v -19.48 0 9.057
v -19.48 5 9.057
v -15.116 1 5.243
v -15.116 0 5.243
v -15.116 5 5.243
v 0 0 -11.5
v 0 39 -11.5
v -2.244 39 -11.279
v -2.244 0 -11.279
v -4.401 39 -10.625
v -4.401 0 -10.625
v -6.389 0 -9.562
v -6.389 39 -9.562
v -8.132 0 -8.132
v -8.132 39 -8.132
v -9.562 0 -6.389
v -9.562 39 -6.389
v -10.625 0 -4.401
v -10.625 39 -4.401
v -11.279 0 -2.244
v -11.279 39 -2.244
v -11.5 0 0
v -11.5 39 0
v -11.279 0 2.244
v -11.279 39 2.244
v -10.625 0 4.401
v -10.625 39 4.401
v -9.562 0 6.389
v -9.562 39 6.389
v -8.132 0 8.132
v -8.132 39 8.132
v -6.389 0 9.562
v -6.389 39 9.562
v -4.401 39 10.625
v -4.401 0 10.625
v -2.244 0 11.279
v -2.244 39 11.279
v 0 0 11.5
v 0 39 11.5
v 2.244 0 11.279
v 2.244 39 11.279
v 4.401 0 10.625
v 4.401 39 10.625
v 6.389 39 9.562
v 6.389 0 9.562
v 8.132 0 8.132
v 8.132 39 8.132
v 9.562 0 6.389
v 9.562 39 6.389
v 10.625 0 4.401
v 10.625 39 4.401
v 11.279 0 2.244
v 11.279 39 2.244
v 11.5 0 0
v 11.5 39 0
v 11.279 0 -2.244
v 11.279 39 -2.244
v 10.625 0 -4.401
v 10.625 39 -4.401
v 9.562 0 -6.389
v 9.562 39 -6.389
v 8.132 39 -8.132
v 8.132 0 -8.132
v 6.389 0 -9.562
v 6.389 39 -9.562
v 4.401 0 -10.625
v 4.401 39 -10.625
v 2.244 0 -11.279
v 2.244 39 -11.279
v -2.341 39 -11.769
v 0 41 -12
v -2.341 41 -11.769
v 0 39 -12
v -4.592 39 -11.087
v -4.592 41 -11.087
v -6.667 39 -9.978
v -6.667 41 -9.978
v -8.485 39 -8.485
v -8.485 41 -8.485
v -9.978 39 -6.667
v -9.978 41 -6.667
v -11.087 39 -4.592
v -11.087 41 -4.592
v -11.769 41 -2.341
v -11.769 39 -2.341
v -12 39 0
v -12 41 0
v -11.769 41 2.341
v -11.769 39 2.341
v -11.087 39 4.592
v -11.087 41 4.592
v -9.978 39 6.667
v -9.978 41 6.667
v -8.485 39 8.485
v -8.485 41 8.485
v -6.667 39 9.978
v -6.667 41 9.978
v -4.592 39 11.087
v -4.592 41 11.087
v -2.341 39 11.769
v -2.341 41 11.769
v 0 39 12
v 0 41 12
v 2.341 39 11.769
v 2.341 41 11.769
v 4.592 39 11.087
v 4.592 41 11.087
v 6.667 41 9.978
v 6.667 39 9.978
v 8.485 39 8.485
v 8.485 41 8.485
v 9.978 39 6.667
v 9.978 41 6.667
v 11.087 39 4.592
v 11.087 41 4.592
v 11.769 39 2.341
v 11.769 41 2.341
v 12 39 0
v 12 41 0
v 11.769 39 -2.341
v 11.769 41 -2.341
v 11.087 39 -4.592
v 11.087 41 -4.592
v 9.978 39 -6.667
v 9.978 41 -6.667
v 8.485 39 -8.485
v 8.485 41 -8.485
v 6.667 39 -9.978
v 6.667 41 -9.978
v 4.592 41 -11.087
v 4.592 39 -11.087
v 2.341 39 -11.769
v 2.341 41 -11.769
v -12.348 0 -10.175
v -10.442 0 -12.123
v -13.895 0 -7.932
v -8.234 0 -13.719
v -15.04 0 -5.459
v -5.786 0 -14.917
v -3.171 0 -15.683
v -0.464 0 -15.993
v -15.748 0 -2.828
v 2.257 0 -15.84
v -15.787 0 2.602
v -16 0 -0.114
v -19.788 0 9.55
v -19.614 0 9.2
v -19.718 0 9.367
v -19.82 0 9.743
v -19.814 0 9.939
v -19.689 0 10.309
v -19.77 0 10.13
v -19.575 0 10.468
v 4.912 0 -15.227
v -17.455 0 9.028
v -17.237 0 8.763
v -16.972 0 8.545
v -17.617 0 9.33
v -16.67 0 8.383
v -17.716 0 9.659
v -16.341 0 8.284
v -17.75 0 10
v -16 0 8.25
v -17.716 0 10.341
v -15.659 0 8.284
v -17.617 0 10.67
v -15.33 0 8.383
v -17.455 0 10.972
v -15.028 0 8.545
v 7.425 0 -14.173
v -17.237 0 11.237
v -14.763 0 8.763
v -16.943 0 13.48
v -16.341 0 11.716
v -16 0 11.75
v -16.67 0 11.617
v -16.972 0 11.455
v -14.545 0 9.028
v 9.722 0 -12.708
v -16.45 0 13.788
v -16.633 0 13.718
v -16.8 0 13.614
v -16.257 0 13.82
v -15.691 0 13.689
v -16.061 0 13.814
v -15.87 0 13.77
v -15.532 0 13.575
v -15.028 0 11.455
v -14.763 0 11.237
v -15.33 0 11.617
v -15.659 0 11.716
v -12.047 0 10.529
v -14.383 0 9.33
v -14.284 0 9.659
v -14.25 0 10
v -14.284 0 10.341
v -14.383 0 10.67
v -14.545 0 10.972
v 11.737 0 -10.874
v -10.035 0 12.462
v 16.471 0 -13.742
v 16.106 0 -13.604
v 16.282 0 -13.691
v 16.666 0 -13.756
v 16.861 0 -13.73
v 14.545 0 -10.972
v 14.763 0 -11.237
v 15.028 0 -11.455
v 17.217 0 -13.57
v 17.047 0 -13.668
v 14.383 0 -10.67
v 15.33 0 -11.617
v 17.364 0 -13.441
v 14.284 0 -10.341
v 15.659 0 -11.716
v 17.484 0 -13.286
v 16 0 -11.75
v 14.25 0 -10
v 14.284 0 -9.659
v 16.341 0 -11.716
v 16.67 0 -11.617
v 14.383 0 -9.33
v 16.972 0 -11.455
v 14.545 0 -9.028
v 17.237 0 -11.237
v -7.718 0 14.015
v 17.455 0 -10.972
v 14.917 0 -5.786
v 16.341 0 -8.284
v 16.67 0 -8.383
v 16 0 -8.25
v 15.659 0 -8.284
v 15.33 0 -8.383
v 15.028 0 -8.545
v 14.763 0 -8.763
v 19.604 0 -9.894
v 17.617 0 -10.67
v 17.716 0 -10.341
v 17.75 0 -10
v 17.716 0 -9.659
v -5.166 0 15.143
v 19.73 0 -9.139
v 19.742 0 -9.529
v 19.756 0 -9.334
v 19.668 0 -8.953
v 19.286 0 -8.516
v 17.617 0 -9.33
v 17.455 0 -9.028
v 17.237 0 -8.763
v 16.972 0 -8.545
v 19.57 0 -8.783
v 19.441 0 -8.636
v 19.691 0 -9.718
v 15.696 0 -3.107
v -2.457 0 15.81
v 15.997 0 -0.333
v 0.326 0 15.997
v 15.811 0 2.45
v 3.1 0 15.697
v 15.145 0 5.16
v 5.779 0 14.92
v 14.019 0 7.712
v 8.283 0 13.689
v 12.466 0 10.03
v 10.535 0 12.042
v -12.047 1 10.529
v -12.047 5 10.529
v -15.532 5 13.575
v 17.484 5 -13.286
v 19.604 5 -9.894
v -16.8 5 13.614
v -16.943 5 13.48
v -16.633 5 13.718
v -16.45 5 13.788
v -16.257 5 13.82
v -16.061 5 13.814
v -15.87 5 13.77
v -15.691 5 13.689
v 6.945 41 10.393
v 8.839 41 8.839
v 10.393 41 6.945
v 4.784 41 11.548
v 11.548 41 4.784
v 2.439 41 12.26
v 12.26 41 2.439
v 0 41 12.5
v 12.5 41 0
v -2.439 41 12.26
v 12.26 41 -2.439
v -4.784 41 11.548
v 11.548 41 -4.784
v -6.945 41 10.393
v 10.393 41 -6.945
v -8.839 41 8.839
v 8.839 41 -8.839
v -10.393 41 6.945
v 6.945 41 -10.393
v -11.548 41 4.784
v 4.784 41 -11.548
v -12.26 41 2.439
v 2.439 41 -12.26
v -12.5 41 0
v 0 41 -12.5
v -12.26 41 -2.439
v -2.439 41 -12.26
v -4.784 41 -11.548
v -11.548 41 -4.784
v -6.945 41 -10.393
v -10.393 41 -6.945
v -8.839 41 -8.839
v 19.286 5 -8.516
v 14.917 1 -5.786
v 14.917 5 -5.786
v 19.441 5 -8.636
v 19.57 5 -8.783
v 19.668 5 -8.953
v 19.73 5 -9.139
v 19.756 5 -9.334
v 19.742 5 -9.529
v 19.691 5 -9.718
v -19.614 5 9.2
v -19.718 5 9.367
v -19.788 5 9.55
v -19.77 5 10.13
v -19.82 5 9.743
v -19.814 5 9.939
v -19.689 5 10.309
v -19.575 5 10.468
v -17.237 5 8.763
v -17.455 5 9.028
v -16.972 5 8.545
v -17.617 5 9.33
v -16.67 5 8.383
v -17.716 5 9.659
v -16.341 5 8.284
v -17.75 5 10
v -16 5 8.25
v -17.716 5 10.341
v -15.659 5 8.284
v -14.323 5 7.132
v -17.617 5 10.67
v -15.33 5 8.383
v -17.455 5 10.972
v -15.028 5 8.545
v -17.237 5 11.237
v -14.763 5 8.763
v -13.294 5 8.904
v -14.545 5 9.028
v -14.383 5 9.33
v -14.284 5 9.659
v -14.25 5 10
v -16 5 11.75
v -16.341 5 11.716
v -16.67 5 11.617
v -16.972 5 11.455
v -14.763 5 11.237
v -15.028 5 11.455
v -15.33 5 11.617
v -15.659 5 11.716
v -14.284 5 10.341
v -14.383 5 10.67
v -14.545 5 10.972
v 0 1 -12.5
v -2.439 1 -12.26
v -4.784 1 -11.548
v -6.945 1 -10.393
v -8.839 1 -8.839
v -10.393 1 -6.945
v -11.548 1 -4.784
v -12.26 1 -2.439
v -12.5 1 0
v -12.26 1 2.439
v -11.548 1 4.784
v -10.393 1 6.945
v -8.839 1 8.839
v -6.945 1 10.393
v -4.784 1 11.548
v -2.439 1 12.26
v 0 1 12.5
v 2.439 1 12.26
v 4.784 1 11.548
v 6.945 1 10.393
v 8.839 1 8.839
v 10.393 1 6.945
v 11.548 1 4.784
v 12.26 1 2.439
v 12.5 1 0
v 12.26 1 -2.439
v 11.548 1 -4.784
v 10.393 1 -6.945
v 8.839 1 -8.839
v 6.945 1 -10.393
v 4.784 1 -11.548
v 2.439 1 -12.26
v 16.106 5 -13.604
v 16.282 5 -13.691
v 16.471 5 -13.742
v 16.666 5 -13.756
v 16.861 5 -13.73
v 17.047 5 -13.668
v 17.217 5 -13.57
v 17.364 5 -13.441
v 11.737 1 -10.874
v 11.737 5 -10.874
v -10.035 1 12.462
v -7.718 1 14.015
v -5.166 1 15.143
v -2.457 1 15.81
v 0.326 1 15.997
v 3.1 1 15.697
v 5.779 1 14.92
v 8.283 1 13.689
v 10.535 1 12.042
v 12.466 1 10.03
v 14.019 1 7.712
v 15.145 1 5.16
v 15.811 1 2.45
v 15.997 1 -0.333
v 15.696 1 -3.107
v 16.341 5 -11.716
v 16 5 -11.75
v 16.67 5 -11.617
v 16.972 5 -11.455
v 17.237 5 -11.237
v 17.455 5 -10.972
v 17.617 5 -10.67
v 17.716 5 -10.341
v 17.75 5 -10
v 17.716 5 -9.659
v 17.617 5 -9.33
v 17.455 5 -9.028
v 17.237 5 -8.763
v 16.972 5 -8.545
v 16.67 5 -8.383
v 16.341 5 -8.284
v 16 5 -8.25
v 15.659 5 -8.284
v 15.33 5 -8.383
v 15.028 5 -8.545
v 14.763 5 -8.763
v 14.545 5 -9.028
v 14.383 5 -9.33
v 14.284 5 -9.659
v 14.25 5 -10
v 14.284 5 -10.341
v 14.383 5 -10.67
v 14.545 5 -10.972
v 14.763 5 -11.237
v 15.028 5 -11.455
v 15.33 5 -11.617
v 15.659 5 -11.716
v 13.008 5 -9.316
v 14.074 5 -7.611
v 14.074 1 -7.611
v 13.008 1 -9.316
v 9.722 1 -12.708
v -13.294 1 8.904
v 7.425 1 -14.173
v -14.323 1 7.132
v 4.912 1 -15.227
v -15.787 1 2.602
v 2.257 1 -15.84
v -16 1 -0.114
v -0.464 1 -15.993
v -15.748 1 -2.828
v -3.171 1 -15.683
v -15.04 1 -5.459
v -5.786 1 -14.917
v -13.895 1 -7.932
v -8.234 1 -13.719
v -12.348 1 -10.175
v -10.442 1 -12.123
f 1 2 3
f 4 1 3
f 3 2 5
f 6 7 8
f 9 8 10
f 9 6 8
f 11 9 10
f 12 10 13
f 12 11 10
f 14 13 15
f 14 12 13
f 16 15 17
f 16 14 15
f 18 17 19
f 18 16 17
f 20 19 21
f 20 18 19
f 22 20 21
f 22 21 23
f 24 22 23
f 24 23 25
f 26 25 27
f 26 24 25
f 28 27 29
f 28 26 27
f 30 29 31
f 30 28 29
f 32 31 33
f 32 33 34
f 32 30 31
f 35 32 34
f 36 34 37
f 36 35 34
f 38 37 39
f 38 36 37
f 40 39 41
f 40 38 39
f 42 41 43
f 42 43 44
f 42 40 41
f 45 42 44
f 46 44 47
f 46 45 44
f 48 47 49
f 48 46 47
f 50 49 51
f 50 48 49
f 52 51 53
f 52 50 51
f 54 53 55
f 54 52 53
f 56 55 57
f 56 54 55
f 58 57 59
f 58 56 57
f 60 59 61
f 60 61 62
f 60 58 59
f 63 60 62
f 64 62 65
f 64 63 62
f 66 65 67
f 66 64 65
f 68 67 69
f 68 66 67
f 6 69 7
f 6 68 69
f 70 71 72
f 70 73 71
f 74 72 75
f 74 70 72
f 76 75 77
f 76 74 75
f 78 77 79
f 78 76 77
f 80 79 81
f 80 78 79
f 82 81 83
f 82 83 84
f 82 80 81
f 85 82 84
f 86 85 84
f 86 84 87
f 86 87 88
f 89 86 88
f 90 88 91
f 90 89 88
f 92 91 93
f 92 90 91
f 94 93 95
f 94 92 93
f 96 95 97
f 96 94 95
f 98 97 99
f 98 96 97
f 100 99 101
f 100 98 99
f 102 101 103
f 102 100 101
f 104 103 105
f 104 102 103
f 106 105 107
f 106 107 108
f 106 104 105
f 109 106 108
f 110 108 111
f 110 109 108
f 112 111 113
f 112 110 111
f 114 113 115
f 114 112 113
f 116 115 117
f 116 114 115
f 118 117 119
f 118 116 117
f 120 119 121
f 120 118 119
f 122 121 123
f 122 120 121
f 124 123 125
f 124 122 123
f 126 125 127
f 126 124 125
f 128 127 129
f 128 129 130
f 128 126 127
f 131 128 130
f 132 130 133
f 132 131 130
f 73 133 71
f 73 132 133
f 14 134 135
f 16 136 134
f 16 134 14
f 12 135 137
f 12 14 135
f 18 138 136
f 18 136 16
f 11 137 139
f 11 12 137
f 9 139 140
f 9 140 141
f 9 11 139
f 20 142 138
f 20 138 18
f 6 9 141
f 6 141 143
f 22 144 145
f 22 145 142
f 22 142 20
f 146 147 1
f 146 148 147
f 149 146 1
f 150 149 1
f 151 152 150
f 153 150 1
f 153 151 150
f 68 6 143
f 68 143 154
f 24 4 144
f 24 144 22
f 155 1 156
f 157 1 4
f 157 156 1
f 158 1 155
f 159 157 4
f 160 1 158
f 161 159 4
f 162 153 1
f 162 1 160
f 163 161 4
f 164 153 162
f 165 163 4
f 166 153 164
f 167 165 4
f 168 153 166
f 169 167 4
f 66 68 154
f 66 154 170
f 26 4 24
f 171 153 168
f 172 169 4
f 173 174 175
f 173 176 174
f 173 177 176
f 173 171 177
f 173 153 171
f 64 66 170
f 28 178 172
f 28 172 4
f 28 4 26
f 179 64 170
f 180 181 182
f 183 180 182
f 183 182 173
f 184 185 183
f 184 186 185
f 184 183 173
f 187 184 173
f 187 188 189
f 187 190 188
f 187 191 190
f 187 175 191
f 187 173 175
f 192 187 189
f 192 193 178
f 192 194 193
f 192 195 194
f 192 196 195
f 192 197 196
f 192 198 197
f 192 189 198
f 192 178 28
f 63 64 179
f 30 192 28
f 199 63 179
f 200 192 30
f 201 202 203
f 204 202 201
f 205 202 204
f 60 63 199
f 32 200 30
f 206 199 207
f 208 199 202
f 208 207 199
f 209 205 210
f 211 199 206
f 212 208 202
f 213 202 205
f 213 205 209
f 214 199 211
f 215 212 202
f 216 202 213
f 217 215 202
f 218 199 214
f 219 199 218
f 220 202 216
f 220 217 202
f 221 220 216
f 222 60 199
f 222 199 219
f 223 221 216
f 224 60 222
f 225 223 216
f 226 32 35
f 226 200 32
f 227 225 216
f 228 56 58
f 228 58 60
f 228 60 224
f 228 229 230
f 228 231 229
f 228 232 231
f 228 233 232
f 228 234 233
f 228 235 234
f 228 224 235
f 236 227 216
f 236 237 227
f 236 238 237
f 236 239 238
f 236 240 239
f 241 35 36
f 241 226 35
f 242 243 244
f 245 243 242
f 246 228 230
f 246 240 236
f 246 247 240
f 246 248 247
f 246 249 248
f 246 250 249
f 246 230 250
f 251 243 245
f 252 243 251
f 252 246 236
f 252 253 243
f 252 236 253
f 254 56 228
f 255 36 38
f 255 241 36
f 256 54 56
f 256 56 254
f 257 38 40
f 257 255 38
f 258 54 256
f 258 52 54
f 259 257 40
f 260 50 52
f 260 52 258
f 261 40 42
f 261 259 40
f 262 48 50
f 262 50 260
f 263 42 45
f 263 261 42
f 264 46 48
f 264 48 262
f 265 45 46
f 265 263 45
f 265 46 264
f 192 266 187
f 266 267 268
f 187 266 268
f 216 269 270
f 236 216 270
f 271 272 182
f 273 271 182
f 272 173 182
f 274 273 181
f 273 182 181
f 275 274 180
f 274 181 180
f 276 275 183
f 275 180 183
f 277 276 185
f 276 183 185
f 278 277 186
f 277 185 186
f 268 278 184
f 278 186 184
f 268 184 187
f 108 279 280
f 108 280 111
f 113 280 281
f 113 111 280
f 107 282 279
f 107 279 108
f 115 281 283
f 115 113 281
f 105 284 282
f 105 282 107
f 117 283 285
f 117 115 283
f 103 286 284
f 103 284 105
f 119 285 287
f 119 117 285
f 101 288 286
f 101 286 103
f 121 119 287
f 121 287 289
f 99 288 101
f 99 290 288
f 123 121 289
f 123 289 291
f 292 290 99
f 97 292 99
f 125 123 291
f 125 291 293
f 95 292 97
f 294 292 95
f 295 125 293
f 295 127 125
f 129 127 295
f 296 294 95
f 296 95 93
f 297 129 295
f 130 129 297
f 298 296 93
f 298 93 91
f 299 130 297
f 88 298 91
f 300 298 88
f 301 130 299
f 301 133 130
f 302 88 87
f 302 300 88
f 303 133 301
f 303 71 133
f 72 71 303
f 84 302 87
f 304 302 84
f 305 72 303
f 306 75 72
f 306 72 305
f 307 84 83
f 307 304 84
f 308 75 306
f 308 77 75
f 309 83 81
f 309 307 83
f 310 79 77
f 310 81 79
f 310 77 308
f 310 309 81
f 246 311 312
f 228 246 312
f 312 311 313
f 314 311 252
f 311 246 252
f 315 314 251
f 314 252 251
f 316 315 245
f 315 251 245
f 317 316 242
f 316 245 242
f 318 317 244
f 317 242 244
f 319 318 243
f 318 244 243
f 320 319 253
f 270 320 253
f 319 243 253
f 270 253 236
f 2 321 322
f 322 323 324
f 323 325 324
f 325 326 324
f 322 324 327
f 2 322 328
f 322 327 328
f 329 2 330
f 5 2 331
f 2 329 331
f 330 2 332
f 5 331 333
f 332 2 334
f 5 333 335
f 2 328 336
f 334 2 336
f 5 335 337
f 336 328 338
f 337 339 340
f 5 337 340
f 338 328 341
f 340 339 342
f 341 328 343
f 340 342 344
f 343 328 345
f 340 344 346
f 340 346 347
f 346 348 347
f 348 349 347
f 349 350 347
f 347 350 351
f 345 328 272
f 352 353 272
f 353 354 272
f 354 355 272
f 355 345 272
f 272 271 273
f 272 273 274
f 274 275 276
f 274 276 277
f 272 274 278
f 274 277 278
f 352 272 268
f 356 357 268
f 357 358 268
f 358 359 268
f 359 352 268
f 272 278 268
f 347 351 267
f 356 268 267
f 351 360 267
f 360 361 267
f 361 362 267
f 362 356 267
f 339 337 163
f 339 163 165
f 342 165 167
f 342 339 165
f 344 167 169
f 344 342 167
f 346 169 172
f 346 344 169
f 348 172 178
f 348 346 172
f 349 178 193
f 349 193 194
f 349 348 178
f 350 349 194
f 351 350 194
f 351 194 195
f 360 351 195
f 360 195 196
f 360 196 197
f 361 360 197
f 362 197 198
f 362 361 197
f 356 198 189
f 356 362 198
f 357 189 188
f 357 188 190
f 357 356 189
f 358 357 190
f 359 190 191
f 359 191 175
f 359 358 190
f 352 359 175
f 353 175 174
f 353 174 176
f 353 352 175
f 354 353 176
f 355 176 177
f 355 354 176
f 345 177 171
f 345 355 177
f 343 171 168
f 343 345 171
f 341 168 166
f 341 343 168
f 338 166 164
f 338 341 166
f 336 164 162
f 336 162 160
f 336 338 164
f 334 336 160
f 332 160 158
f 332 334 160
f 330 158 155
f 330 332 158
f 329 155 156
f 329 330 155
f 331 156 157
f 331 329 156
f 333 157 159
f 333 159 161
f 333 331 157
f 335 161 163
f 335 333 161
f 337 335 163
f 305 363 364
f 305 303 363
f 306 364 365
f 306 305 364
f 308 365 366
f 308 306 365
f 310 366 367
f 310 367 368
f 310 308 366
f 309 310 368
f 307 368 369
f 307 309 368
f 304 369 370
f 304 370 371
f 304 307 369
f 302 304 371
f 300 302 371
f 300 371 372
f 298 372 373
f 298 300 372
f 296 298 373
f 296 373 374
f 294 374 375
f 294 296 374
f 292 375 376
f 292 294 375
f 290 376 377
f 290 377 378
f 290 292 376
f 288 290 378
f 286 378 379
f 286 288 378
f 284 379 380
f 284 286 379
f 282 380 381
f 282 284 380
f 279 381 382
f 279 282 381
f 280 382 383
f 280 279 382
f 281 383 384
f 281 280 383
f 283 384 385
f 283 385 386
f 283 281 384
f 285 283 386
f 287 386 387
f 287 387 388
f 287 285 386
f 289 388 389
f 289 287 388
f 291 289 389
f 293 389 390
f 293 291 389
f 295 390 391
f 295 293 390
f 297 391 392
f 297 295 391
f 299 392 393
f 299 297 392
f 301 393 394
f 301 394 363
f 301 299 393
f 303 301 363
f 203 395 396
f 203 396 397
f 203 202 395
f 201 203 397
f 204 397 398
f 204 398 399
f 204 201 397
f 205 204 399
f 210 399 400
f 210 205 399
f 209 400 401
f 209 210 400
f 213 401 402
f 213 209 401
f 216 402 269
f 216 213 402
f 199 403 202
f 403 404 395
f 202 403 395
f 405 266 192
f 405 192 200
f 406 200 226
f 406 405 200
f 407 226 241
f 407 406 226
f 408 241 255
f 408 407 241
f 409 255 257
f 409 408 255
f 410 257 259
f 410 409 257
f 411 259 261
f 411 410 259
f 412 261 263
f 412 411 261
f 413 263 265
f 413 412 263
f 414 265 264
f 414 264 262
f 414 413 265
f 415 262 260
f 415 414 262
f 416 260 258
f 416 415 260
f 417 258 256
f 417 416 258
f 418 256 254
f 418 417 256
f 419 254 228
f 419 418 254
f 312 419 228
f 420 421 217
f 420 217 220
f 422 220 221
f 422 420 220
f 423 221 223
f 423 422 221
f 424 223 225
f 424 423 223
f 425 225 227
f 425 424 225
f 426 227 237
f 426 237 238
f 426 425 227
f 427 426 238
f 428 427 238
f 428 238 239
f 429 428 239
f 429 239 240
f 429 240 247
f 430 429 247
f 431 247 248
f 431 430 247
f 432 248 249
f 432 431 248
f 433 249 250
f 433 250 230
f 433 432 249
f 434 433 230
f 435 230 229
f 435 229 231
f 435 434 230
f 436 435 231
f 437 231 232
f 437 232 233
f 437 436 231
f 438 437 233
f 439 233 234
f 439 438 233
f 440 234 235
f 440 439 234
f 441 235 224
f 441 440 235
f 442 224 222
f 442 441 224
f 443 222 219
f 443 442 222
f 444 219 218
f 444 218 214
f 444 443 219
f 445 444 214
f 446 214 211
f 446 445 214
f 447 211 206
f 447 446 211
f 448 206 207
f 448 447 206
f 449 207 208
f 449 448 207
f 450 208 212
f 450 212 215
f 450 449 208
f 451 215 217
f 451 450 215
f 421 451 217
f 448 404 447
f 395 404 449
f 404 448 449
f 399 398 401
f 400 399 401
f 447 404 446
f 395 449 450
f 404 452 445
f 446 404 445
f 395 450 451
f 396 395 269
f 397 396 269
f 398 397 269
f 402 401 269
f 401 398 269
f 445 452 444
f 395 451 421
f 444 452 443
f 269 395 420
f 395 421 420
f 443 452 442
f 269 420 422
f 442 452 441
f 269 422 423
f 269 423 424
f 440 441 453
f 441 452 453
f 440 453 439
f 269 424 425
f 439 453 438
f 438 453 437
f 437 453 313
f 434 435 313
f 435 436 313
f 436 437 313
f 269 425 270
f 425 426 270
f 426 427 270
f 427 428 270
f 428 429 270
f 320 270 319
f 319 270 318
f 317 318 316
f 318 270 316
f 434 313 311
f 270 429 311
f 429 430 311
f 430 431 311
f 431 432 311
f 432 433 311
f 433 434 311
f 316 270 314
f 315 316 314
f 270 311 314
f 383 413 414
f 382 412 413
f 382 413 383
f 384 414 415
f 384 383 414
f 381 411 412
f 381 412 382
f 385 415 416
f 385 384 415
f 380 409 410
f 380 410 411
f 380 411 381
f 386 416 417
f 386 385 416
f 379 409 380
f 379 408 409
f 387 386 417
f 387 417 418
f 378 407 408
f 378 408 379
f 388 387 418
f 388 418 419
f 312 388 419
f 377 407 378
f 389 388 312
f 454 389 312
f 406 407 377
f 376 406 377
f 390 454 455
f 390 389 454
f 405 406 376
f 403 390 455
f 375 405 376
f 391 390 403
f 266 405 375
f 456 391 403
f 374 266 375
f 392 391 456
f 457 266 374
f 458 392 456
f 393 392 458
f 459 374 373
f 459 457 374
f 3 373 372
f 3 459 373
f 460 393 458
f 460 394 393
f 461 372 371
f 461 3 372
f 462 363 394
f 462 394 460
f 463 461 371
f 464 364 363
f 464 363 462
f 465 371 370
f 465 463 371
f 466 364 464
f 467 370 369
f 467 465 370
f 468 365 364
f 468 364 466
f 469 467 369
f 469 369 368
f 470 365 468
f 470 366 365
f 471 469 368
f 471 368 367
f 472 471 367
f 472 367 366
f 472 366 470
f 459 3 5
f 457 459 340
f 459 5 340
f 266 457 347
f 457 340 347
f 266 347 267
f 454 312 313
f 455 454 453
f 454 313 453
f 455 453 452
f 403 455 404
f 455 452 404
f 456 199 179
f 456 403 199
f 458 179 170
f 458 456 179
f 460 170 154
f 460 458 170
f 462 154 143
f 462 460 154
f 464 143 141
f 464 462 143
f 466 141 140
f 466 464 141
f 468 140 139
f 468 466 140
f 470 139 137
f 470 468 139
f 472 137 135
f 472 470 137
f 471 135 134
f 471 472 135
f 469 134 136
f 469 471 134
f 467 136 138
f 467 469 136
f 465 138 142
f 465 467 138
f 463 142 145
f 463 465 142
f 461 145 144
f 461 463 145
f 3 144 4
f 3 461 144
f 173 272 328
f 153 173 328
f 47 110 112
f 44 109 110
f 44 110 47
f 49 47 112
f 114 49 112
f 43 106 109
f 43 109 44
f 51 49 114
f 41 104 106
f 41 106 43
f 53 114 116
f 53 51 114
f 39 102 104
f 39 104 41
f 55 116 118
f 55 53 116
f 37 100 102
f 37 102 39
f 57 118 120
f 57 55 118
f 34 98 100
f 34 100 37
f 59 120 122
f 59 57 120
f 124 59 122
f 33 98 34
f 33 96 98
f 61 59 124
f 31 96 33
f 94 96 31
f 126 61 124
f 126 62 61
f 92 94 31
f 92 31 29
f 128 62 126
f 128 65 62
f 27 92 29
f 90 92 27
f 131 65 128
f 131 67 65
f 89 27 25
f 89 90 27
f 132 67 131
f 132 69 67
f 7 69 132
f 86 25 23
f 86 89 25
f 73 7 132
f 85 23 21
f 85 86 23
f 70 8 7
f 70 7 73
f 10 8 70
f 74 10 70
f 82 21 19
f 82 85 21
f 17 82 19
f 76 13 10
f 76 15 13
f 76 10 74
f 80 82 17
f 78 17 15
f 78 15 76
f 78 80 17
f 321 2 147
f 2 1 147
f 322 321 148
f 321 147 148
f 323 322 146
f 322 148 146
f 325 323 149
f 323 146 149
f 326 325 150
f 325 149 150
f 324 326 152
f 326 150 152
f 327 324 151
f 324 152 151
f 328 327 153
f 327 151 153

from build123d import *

# Parameters (mm, degrees)
BOSS_EXTRUDE1_START = -5
SKETCH2_R           = 1.75
BOSS_EXTRUDE1_DEPTH = 5
FILLET1_R           = 1


with BuildPart() as part:
    # Sketch1 → Revolve1 (revolve)
    with BuildSketch(Plane.XY, mode=Mode.PRIVATE) as revolve1_sk:
        Polygon((-11.5, 0), (-16, 0), (-16, 1), (-12.5, 1), (-12.5, 41), (-12, 41), (-12, 39), (-11.5, 39), align=None)
    revolve(revolve1_sk.sketch.rotate(Axis((0, 0, 0), (0, 1, 0)), 270), axis=Axis((0, 0, 0), (0, 1, 0)))

    # Sketch2 → Boss-Extrude1 (add)
    # profile 1 of 2: a face of its own
    with BuildSketch(Plane.XZ.offset(BOSS_EXTRUDE1_START)):
        with BuildLine():
            Line((20.133991732, -9.046001908), (14.917336297, -5.785592261))
            ThreePointArc((14.917336297, -5.785592261), (13.567972864, -8.47998304), (11.737342657, -10.873582085))
            Line((11.737342657, -10.873582085), (16.953998092, -14.133991732))
            Line((16.953998092, -14.133991732), (20.133991732, -9.046001908))
        make_face()
        with Locations(Location((16, -10, 0), (0, 0, 270))):
            Circle(SKETCH2_R, mode=Mode.SUBTRACT)
    # profile 2 of 2: a face of its own
    with BuildSketch(Plane.XZ.offset(BOSS_EXTRUDE1_START)):
        with BuildLine():
            Line((-20.233087103, 9.715441438), (-15.116447525, 5.243378132))
            ThreePointArc((-15.116447525, 5.243378132), (-13.836527765, 8.034332543), (-12.047055108, 10.529409443))
            Line((-12.047055108, 10.529409443), (-16.284558562, 14.233087103))
            Line((-16.284558562, 14.233087103), (-20.233087103, 9.715441438))
        make_face()
        with Locations(Location((-16, 10, 0), (0, 0, 270))):
            Circle(SKETCH2_R, mode=Mode.SUBTRACT)
    extrude(amount=BOSS_EXTRUDE1_DEPTH)

    # Fillet1
    fillet1_edges = [part.edges().sort_by_distance(p)[0] for p in [
        (-20.233087103, 2.5, 9.715441438),
        (-16.284558562, 2.5, 14.233087103),
        (16.953998092, 2.5, -14.133991732),
        (20.133991732, 2.5, -9.046001908),
    ]]
    fillet(fillet1_edges, radius=FILLET1_R)


solid = part.part
